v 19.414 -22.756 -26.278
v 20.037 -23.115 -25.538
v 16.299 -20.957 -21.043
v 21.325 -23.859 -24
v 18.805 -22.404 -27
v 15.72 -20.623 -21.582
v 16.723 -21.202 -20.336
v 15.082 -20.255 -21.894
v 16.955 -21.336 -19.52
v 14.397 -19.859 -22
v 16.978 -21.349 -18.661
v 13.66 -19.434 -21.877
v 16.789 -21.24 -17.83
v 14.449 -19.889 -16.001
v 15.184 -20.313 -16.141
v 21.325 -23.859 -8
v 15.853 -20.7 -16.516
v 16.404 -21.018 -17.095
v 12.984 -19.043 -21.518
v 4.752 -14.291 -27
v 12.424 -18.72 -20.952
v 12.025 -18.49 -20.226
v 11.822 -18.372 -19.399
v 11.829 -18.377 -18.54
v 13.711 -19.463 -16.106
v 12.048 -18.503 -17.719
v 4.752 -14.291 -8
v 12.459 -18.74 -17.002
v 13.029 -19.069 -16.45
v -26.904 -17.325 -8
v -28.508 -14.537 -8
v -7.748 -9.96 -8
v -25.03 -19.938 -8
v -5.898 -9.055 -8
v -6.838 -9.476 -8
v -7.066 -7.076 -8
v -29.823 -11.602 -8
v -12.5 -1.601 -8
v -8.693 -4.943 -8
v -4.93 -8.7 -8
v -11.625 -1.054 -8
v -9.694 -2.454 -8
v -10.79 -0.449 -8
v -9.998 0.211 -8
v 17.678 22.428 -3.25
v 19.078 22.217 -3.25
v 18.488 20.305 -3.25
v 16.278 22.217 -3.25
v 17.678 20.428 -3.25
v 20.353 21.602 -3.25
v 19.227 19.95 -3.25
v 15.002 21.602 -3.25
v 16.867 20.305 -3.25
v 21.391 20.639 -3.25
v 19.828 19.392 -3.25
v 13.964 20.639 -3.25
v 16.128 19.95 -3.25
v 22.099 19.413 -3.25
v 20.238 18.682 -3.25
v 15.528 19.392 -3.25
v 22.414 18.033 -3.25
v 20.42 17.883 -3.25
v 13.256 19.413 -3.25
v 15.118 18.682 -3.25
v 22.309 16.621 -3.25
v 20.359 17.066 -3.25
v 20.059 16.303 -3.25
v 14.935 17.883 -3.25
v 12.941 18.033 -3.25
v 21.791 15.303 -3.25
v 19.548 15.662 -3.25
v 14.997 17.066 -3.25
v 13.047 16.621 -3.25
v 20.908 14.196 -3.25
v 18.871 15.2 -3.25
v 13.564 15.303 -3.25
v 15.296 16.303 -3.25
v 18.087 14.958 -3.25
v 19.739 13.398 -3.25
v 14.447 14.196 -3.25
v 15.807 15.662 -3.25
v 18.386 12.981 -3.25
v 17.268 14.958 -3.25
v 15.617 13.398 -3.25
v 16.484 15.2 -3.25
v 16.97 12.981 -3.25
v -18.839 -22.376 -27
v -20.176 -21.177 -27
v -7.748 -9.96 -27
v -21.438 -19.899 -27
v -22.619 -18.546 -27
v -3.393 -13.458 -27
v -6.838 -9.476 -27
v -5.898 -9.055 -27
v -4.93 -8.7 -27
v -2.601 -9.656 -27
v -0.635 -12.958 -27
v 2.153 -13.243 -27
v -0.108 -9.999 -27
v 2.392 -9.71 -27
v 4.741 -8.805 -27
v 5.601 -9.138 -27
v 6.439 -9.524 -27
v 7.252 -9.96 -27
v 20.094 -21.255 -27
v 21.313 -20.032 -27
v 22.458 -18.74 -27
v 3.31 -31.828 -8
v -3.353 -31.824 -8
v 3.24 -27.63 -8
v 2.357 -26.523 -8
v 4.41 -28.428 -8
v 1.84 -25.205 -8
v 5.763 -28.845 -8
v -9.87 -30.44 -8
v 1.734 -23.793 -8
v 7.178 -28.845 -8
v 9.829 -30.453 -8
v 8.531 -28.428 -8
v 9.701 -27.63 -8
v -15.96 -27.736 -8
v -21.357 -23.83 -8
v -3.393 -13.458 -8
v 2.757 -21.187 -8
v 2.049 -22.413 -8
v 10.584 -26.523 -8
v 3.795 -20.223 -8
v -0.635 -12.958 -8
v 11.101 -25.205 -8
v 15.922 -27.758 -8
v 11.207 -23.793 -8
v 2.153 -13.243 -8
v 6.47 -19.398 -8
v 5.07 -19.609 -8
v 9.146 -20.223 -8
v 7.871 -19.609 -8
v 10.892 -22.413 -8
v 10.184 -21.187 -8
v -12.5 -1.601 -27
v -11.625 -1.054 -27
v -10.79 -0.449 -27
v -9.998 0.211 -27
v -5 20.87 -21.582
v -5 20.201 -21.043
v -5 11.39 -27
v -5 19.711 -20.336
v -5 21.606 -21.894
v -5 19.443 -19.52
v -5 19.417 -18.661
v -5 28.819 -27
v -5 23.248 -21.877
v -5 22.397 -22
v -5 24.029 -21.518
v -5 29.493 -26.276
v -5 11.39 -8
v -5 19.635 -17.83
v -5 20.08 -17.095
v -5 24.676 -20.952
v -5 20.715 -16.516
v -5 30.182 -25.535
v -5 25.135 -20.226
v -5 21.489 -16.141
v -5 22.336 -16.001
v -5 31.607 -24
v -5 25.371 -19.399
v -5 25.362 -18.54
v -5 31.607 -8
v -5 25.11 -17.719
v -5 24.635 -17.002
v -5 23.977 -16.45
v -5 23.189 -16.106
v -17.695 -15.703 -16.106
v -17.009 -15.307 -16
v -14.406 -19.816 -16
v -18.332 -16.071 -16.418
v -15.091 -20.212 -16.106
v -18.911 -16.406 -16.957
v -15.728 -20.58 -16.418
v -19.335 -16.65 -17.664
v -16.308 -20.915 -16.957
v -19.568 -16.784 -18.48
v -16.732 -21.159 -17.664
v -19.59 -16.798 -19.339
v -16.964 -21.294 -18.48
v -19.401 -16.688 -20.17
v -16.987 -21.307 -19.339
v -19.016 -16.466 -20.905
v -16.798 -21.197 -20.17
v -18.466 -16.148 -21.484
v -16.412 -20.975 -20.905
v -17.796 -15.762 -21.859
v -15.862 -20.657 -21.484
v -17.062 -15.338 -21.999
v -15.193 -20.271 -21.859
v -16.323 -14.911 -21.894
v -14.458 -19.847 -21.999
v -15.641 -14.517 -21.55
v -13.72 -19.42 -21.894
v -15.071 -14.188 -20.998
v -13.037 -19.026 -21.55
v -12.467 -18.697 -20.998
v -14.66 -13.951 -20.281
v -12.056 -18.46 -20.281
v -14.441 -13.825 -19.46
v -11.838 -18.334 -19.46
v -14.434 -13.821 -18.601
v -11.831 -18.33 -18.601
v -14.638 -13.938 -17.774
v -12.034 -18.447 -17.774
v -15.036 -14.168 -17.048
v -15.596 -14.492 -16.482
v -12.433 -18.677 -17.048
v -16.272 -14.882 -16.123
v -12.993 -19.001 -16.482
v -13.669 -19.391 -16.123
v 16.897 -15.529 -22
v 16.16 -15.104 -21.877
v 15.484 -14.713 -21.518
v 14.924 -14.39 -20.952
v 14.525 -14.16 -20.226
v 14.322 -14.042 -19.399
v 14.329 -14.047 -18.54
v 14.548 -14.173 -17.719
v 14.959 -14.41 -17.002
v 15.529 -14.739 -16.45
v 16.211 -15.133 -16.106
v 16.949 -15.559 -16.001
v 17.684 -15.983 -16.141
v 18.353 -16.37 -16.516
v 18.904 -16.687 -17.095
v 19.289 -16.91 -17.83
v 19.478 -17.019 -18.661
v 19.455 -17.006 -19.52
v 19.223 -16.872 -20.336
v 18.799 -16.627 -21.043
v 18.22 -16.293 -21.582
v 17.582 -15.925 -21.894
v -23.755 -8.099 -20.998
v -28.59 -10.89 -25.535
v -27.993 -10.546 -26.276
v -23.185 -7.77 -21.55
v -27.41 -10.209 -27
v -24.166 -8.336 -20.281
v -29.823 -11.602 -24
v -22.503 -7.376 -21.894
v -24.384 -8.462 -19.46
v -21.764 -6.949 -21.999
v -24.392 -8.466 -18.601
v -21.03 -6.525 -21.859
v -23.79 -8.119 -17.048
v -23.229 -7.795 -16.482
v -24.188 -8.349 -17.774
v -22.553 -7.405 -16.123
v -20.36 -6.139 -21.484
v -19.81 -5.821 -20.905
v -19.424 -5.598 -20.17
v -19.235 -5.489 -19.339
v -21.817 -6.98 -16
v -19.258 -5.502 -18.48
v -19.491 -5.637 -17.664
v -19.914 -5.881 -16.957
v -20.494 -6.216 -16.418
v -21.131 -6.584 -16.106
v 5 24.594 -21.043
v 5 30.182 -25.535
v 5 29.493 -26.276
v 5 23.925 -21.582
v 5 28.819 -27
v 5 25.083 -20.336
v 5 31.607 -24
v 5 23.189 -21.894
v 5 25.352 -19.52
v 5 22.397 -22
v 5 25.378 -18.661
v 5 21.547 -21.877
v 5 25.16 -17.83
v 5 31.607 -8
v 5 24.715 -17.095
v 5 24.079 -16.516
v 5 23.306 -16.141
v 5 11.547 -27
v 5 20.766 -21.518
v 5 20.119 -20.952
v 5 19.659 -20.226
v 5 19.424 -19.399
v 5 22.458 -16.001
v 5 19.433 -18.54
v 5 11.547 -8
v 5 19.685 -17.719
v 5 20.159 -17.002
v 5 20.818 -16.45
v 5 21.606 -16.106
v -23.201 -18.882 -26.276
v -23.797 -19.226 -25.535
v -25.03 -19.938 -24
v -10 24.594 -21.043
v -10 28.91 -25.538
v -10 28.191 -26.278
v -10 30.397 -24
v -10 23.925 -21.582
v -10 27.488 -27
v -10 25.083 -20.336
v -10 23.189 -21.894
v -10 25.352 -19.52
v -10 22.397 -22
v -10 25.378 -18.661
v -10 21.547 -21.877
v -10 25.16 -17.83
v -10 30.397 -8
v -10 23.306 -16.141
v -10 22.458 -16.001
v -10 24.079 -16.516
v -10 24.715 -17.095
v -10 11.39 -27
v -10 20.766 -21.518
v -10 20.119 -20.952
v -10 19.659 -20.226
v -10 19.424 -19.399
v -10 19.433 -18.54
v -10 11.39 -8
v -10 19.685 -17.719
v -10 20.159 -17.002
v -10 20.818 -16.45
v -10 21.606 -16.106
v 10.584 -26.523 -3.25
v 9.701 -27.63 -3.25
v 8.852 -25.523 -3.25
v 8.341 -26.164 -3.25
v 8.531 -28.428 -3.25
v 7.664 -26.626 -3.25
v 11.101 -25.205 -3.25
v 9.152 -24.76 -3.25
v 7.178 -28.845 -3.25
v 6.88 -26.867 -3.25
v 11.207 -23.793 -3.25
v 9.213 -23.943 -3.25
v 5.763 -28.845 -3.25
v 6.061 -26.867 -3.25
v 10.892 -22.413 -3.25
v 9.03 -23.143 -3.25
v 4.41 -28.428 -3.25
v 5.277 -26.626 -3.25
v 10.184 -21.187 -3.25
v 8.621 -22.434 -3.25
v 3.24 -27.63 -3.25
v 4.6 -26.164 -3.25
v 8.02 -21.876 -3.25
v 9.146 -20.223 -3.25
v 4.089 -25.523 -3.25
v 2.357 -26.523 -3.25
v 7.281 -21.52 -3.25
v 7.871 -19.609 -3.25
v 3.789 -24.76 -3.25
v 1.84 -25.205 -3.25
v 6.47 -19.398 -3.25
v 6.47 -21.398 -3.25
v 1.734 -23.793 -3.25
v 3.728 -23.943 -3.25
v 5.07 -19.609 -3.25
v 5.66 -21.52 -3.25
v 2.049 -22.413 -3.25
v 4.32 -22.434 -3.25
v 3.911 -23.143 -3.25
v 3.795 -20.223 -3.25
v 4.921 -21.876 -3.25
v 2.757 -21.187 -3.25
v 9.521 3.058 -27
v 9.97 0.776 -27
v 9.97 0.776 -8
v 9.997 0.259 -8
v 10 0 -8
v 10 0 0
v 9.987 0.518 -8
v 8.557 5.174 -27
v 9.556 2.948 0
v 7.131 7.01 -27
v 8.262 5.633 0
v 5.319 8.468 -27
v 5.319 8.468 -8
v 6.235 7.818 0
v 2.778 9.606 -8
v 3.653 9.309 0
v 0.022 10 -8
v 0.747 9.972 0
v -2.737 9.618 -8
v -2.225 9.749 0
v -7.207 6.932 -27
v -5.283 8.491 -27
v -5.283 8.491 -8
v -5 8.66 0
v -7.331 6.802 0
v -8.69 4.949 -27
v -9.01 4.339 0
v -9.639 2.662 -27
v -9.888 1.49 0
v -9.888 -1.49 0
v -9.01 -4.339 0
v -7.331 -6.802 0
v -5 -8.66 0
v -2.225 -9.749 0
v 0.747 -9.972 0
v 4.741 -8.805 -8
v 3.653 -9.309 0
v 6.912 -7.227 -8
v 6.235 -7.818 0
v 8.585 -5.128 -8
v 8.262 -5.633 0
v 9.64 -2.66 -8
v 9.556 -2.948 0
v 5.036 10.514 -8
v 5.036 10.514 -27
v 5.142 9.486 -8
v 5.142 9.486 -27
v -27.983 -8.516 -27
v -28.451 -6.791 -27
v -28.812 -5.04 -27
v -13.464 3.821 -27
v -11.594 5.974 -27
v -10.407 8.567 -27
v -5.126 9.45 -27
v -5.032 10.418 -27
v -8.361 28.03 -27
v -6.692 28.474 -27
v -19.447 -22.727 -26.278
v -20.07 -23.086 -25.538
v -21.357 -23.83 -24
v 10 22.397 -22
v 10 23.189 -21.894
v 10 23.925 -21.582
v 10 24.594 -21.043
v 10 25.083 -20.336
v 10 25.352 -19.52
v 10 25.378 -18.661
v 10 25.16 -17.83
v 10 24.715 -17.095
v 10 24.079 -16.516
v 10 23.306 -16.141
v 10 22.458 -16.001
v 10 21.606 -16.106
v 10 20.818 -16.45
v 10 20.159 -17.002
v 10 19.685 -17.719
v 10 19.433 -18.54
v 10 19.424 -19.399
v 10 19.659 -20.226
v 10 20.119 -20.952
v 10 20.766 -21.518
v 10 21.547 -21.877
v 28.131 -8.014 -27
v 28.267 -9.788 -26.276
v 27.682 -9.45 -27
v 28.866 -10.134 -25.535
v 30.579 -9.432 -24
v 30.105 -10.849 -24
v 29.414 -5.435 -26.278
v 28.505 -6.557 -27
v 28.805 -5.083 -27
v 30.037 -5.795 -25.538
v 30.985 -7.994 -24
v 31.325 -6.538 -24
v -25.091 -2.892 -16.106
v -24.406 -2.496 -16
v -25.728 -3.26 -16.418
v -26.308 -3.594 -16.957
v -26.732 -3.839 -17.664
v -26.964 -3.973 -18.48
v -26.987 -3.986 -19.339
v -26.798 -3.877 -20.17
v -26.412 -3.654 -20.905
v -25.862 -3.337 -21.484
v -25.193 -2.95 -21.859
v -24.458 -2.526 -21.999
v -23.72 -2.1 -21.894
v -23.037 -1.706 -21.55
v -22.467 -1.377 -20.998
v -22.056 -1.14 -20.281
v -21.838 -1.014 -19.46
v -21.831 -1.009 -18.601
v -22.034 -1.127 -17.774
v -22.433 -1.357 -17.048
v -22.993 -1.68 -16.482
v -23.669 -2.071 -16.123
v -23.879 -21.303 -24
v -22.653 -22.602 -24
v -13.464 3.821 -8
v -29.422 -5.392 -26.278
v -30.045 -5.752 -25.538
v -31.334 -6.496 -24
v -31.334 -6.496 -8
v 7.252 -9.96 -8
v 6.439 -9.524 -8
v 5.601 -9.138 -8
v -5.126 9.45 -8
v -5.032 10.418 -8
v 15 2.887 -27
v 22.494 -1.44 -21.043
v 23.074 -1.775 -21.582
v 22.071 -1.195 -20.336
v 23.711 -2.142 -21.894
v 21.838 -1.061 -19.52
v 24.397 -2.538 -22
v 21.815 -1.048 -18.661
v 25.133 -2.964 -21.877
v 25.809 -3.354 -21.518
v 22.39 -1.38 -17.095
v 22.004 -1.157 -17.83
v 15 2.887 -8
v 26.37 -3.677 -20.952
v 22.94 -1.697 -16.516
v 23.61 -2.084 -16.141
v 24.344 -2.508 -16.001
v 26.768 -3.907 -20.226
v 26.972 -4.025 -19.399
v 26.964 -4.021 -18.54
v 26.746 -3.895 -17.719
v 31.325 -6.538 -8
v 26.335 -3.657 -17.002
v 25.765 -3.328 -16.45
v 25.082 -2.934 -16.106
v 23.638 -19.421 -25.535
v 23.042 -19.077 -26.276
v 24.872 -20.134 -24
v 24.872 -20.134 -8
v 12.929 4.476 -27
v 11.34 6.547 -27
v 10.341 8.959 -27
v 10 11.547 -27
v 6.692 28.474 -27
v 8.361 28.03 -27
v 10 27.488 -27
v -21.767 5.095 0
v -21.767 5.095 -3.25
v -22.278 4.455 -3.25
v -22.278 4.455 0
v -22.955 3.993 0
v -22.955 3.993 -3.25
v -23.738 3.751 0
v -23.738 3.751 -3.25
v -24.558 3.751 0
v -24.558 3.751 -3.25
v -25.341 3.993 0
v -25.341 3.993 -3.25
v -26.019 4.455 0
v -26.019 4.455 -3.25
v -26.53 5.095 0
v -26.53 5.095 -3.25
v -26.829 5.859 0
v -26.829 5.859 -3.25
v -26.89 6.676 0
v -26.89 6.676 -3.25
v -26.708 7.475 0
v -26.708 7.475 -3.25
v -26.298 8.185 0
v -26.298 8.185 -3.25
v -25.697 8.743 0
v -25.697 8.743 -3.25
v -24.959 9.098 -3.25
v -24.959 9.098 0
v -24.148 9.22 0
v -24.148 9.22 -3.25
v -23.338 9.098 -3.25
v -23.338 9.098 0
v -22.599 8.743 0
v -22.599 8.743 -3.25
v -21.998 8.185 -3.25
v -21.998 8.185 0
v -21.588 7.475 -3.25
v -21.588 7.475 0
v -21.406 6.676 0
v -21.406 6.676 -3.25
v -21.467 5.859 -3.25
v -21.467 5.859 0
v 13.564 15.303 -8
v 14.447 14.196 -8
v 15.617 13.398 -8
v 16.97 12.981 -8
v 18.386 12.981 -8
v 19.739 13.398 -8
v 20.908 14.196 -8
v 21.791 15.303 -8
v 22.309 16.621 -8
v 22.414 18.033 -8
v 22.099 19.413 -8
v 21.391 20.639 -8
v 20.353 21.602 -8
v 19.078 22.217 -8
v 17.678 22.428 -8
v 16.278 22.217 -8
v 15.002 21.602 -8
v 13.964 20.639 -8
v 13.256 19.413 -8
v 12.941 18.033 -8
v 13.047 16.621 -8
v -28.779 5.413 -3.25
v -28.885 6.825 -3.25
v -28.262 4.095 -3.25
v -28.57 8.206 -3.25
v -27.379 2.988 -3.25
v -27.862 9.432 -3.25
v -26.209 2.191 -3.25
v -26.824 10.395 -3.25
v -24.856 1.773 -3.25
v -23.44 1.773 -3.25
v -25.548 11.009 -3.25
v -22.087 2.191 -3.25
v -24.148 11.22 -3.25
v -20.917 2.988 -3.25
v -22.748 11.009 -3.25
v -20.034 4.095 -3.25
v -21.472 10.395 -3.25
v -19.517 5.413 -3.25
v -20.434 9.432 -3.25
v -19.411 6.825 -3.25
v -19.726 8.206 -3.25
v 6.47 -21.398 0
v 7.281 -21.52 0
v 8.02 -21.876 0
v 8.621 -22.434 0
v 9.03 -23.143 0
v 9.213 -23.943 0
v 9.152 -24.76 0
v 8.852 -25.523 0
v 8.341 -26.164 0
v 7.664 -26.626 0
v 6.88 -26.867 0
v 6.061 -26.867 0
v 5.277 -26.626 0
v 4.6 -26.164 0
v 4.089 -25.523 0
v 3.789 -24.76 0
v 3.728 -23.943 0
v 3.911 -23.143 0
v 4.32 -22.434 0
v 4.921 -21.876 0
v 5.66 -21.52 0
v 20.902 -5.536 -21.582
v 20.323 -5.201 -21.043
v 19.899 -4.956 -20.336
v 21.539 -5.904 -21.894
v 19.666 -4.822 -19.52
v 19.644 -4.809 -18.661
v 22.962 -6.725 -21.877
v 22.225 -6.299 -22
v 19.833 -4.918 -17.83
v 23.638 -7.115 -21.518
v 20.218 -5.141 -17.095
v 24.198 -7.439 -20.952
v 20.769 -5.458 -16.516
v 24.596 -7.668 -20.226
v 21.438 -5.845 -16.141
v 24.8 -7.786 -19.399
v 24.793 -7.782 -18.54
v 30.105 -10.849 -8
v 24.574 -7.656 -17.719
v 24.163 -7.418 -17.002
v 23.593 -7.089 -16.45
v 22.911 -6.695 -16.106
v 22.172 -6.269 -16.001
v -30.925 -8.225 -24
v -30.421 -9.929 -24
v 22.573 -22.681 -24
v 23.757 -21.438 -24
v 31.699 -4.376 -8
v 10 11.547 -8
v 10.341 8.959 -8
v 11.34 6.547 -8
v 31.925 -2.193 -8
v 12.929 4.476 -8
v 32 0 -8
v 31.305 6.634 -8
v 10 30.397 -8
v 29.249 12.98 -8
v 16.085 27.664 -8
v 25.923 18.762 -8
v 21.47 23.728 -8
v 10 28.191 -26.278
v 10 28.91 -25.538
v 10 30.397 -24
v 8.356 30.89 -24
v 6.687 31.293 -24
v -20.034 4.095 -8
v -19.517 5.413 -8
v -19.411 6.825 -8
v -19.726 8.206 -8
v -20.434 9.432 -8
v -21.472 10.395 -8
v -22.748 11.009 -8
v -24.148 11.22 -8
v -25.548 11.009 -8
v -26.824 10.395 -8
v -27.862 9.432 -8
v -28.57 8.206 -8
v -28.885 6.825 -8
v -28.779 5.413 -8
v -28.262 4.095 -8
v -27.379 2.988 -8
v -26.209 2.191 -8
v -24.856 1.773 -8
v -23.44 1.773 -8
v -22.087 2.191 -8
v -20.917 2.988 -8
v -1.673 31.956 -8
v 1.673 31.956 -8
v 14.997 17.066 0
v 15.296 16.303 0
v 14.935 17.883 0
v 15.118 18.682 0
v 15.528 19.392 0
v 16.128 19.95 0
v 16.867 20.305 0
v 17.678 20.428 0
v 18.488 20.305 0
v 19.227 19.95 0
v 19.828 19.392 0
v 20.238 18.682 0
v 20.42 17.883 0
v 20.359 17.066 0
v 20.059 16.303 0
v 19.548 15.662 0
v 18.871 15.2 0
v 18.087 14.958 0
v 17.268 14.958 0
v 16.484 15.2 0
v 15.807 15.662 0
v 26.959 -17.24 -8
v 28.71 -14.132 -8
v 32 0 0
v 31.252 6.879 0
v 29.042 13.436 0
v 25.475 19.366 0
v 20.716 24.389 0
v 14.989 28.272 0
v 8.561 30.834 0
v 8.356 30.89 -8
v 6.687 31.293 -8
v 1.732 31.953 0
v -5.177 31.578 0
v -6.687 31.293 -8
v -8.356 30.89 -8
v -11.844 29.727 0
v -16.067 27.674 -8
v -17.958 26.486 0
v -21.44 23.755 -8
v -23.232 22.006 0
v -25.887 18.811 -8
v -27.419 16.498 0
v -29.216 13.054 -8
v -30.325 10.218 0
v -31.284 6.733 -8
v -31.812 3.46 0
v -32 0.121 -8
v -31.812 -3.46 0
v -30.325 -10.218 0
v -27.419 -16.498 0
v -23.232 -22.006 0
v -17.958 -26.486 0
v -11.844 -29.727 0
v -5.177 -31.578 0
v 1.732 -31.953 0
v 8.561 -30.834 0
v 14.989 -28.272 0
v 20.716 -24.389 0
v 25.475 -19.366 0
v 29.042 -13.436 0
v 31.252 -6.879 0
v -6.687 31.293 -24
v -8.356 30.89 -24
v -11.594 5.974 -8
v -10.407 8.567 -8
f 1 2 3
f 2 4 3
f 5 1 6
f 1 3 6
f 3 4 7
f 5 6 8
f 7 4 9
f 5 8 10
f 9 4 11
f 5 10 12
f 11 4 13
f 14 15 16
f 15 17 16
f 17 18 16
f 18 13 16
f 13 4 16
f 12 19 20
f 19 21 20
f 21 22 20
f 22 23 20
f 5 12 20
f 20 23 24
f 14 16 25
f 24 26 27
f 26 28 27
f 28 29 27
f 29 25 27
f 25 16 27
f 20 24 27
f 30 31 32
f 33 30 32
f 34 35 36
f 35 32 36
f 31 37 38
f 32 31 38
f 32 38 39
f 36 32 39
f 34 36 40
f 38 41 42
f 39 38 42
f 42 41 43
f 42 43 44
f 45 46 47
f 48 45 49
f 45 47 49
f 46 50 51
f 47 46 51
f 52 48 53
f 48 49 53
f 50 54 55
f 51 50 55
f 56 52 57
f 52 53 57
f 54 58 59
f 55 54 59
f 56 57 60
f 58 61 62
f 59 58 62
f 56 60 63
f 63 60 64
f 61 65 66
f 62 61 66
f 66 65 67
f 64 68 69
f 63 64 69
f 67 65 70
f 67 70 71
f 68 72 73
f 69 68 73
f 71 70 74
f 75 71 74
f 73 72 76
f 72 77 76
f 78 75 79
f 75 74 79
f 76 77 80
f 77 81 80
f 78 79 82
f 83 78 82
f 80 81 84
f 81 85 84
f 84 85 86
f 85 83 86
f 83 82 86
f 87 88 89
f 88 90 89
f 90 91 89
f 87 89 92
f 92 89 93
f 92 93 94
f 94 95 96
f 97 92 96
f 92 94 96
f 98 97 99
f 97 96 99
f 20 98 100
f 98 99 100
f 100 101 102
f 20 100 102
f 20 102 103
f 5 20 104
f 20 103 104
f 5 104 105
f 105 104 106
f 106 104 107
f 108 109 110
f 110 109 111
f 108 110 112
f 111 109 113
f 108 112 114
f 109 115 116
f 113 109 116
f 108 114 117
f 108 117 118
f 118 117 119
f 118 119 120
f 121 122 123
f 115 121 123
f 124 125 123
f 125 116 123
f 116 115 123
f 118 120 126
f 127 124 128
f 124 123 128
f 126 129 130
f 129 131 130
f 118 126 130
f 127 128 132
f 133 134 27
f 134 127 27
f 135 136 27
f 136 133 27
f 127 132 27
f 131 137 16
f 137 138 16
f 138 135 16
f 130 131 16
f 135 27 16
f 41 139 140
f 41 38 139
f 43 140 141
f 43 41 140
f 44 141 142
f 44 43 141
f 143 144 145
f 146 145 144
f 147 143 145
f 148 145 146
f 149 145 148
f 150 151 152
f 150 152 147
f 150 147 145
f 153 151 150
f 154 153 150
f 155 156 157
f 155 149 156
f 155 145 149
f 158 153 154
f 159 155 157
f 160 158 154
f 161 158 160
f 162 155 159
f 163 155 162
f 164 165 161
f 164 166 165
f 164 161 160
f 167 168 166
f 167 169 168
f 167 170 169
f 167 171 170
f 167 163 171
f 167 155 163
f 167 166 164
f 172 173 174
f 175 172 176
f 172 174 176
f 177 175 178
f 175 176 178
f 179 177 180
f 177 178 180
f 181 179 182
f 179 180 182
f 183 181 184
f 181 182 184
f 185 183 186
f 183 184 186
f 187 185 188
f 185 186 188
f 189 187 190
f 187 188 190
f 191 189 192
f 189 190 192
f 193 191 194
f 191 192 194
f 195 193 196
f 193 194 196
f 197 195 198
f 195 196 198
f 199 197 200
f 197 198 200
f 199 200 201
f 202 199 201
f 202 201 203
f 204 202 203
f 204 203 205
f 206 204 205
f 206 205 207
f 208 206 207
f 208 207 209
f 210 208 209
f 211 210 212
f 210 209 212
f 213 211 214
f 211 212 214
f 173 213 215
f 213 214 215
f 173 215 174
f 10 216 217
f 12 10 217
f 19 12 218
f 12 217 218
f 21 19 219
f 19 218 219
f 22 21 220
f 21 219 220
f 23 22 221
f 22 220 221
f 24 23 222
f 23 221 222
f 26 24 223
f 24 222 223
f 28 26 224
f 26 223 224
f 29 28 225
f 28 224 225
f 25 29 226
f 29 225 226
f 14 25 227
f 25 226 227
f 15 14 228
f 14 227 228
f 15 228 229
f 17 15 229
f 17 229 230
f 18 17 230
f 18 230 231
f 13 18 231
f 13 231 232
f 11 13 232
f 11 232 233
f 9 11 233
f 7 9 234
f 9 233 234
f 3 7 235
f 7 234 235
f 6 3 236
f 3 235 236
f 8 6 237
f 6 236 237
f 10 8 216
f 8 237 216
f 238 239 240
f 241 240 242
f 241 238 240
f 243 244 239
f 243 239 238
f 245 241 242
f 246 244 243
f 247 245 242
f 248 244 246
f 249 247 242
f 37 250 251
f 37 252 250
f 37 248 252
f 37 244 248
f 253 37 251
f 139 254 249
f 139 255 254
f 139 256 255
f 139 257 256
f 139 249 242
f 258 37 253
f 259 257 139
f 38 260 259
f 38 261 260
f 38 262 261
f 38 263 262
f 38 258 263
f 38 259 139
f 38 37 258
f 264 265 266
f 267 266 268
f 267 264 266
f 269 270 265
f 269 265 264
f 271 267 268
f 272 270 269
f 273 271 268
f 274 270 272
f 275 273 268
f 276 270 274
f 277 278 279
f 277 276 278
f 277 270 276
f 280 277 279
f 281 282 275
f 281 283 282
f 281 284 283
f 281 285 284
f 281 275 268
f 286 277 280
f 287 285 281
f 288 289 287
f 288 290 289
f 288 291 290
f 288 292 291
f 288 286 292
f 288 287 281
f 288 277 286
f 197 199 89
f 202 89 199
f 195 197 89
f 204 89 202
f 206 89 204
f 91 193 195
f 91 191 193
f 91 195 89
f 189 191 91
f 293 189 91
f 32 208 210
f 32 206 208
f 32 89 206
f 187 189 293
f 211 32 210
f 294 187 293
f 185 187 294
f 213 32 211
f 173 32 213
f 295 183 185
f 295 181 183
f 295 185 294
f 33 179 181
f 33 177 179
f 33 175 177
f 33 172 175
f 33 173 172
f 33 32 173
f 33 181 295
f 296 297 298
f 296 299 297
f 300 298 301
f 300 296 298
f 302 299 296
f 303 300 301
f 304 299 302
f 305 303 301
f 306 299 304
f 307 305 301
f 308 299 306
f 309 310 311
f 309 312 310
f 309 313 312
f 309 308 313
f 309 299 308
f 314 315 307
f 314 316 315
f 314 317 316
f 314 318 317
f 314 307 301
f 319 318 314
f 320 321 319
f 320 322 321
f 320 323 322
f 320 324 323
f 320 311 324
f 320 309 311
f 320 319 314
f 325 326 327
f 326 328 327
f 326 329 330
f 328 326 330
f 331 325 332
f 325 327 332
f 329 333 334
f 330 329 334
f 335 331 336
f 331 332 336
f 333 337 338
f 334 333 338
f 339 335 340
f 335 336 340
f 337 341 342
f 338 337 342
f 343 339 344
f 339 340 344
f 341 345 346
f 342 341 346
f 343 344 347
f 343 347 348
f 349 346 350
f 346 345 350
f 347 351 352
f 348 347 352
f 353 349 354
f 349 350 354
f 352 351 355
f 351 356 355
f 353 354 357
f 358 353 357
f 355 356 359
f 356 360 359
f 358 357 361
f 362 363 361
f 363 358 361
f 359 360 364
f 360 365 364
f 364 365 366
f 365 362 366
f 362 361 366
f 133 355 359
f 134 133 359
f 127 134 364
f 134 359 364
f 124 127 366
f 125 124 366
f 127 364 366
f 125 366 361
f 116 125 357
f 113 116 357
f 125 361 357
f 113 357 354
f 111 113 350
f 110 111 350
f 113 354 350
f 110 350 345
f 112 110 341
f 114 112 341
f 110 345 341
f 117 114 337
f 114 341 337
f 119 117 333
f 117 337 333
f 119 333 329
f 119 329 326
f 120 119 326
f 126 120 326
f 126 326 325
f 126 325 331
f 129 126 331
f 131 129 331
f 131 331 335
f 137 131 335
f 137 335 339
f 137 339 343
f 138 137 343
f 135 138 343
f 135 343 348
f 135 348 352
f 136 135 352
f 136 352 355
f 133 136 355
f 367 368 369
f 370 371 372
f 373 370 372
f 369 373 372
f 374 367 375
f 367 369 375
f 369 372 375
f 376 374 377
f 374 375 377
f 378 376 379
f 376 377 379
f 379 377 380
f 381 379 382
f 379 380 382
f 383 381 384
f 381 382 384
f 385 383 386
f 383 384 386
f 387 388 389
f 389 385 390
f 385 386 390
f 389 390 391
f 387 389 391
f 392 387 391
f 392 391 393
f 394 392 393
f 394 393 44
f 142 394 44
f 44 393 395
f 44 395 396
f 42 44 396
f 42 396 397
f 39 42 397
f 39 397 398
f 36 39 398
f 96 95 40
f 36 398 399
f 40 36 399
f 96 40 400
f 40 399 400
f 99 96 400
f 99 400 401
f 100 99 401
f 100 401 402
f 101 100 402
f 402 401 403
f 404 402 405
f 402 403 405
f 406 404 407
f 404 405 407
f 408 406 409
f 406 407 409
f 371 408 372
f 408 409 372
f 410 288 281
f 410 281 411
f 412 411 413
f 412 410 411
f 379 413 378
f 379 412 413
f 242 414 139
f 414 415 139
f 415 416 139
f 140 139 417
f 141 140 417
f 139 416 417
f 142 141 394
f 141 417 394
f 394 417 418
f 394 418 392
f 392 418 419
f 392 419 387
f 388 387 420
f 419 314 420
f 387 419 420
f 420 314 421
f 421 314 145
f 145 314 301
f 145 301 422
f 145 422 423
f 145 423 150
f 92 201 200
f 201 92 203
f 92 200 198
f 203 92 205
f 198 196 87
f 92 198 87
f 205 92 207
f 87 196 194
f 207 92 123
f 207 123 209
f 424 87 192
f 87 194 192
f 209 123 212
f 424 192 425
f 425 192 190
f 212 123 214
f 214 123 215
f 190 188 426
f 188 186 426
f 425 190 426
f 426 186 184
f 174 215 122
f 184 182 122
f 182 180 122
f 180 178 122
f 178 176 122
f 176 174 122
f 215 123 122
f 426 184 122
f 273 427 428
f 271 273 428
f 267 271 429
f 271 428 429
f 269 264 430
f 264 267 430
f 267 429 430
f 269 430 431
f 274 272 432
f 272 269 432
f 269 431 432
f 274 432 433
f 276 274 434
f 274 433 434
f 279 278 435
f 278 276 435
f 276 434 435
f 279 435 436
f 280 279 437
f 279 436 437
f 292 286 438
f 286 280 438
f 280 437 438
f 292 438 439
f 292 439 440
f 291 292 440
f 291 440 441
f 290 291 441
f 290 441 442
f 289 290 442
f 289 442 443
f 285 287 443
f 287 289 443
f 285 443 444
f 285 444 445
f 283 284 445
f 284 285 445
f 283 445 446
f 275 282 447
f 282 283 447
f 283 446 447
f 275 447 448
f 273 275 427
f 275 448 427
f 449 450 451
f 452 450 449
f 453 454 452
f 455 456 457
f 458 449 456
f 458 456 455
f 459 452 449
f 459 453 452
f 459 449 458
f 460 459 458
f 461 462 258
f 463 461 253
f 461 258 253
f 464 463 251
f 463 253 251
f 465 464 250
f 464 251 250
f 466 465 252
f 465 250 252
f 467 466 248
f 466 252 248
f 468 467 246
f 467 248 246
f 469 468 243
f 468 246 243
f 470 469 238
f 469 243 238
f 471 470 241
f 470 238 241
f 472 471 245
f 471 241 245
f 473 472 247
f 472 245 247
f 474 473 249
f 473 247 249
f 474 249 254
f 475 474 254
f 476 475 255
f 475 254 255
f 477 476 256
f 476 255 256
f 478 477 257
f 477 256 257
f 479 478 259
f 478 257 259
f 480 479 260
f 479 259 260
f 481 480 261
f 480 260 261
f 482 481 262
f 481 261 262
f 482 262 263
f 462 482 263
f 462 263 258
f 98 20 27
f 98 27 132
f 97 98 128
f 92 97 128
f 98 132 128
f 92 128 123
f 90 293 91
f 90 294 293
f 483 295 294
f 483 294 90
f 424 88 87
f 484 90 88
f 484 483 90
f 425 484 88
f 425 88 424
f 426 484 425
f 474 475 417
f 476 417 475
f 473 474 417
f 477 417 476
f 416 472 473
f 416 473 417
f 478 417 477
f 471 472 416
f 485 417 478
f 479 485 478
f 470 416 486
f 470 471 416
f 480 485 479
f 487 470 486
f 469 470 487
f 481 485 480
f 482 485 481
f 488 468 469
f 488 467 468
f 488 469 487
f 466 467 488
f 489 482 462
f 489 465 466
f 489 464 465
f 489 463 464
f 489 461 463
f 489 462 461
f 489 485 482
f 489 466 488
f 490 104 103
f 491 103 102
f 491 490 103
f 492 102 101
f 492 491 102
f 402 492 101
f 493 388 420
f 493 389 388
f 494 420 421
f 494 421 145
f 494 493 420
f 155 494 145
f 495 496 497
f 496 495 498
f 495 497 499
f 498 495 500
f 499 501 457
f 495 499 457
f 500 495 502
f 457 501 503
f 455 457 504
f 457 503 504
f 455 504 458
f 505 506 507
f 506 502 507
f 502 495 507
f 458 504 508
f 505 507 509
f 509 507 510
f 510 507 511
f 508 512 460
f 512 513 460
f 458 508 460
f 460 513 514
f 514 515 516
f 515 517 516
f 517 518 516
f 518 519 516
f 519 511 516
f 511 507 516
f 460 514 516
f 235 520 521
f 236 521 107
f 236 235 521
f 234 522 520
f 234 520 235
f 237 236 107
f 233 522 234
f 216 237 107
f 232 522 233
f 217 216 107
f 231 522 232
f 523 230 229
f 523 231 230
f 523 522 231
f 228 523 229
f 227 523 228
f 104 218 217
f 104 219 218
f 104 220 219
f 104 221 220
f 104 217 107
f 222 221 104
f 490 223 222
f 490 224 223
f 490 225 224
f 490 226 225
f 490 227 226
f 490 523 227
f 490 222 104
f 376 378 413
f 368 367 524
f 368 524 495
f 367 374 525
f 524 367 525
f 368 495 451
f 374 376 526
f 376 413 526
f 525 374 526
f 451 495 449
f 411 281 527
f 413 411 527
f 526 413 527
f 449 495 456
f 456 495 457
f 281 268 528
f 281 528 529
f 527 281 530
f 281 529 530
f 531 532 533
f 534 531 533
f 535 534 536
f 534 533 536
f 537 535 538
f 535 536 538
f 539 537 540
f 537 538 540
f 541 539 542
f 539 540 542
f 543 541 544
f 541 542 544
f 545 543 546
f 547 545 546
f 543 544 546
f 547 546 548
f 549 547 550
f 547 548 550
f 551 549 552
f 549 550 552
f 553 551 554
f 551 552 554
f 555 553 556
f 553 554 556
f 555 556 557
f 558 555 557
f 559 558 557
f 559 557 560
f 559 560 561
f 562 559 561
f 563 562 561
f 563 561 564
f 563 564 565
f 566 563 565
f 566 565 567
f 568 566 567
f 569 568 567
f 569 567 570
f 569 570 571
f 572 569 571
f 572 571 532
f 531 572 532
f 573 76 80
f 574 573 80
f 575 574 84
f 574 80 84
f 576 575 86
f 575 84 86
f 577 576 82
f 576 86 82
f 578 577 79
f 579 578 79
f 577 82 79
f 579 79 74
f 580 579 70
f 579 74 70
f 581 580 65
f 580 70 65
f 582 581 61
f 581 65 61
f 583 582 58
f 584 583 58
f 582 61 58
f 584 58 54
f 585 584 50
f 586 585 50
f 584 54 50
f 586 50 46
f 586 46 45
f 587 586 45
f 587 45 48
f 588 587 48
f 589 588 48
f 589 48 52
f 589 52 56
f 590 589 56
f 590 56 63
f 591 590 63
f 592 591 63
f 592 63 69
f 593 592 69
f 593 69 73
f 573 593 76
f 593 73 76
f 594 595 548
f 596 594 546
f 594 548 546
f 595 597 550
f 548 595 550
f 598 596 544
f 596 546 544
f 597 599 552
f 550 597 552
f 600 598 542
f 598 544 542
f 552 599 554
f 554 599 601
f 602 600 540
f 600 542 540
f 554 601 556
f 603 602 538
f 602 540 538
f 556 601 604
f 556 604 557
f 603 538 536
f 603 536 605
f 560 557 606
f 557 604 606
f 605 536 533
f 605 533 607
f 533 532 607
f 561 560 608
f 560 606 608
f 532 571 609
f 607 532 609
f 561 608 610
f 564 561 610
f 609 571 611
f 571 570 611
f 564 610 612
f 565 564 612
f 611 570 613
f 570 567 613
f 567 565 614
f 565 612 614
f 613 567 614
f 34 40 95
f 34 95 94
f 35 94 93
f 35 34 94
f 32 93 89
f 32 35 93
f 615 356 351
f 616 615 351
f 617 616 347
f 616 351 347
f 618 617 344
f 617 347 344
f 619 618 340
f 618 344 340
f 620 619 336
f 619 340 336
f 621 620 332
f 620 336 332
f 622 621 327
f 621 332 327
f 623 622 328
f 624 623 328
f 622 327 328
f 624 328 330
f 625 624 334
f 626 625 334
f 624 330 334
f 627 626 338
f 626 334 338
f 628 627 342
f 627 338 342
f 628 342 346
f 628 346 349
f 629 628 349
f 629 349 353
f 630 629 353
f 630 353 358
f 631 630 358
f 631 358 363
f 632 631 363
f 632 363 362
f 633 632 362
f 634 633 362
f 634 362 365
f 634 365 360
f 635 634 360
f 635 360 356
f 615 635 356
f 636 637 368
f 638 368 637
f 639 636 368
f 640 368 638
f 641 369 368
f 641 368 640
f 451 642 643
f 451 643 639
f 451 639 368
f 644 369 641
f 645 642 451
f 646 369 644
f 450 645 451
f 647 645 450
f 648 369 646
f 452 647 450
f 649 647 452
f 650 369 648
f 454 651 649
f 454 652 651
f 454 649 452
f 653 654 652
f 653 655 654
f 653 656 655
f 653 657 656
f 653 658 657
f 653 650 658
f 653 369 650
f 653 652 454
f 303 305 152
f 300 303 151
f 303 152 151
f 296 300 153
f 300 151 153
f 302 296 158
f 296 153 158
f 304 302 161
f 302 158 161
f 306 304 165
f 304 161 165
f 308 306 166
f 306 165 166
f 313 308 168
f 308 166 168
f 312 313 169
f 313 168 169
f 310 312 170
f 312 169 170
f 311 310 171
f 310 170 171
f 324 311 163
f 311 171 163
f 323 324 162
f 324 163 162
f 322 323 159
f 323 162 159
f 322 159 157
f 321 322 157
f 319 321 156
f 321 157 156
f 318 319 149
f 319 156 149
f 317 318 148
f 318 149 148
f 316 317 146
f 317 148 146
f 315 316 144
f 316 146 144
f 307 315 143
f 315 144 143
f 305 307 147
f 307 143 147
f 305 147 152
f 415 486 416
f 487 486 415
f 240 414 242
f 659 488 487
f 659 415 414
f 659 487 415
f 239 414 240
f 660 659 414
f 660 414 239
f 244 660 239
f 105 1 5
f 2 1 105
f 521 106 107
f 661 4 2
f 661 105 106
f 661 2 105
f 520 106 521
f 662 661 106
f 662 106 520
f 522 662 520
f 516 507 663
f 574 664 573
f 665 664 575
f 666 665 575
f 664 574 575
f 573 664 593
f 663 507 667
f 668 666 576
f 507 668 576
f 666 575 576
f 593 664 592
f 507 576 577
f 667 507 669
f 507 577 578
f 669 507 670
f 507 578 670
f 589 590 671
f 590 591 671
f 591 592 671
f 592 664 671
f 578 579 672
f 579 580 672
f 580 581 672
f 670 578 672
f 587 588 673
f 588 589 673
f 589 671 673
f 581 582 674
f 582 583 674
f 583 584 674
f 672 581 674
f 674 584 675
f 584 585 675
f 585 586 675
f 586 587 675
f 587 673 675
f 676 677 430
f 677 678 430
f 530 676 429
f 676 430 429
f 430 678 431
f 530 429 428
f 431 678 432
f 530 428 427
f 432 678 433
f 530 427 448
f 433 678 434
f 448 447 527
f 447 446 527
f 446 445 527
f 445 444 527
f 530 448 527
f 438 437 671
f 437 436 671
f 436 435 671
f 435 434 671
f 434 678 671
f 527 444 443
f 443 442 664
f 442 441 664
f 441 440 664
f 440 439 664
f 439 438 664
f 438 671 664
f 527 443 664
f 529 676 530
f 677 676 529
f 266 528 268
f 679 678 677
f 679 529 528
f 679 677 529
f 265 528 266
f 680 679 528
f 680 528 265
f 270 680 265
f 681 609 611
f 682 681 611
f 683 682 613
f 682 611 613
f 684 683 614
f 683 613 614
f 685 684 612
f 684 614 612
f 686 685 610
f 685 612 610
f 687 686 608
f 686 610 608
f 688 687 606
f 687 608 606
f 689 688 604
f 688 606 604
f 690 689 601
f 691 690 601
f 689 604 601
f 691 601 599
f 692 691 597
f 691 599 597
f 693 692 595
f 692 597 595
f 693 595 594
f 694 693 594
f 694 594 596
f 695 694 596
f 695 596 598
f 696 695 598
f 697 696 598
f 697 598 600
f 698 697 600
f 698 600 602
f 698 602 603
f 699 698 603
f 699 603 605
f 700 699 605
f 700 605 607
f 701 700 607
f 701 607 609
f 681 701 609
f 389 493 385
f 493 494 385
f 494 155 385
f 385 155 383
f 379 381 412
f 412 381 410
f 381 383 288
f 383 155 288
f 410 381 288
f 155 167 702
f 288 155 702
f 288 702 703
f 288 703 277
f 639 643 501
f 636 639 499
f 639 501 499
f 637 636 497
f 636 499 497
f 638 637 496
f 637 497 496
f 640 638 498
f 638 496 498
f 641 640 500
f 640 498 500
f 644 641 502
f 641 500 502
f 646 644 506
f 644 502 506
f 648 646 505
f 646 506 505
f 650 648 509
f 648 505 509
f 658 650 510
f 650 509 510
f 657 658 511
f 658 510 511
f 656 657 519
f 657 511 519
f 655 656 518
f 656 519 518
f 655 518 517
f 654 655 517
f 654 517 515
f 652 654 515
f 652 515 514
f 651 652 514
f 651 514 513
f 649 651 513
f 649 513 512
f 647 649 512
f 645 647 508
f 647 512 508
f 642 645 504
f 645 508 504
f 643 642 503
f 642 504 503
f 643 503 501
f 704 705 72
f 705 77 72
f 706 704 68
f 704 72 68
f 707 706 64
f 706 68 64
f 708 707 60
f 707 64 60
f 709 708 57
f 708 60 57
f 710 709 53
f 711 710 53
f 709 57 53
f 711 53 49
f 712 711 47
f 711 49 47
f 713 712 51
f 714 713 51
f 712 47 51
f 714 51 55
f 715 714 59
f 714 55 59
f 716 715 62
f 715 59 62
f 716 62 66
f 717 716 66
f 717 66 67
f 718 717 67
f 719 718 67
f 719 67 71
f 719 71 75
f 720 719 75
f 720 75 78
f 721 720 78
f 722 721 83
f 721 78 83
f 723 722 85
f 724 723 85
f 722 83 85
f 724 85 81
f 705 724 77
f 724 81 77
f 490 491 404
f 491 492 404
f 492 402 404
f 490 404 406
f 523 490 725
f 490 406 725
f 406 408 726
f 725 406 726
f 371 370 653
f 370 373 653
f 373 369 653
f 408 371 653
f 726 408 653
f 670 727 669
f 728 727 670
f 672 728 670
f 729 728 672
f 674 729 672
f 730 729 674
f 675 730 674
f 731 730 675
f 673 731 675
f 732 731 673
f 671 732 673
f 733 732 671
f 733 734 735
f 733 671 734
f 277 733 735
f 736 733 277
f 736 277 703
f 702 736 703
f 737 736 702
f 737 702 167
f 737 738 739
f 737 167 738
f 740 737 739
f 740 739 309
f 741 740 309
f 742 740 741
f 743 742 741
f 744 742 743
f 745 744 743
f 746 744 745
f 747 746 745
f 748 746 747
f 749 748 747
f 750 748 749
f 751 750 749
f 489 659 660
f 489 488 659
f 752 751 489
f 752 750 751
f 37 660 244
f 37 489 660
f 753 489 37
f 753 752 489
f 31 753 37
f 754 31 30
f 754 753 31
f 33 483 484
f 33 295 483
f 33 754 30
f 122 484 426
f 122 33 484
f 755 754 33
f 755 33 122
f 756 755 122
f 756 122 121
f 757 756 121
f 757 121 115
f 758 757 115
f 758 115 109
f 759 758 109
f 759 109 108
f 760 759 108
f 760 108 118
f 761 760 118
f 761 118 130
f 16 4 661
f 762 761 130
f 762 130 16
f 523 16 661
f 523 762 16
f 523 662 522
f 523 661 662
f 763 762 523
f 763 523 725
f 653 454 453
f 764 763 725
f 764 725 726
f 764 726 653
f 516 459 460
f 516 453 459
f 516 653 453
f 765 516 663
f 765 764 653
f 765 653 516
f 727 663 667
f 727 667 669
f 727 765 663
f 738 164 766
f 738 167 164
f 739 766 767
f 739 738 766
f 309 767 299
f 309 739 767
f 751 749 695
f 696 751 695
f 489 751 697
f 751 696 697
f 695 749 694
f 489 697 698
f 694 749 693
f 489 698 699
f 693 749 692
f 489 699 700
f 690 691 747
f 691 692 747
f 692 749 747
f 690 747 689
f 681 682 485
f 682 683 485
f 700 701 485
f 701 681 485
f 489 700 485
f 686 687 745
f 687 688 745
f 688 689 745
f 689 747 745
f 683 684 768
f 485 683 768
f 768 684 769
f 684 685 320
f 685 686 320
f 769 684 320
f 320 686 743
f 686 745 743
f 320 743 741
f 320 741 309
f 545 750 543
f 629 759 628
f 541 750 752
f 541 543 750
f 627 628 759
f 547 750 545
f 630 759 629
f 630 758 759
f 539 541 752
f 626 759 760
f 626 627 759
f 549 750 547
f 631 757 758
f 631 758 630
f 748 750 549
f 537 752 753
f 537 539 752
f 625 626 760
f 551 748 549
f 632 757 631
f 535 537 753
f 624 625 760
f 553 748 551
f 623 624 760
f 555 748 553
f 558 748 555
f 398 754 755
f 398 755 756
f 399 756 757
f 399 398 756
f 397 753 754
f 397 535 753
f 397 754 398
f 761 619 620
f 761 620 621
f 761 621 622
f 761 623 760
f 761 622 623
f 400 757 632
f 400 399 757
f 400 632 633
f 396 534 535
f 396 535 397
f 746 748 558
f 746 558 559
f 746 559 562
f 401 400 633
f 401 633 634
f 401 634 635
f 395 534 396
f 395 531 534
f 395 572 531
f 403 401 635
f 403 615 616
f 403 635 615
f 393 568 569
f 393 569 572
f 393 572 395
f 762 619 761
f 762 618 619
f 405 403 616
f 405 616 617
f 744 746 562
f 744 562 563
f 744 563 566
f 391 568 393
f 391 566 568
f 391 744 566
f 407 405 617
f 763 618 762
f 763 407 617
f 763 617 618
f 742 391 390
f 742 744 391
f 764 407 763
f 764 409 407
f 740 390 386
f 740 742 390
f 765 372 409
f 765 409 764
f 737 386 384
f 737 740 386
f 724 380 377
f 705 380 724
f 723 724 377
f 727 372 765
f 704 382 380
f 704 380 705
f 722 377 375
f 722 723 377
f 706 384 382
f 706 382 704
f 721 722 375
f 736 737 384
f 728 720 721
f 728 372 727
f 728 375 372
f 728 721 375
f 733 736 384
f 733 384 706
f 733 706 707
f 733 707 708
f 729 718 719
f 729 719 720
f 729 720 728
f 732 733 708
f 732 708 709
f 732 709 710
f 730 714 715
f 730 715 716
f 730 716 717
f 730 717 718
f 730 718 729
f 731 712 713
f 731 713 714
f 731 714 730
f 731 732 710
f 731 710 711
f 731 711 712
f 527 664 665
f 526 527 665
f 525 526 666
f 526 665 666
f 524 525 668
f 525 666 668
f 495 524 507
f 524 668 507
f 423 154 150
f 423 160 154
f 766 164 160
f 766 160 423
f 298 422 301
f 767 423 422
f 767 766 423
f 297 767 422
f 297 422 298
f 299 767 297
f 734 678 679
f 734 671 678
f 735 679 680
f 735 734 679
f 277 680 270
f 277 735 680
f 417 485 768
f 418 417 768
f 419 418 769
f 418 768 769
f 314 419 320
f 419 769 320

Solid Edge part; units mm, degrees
sketch "Sketch1" plane through (0, 0, 0) normal (0, 0, 1) x (1, 0, 0)
  circle A0 centre (0, 0) radius 32
extrude "Protrusion1" add sketch "Sketch1" against normal blind 8
sketch "Sketch2" plane through (0, 0, 0) normal (0, 0, 1) x (1, 0, 0)
  circle A0 centre (0, 0) radius 10
extrude "nucleo" add sketch "Sketch2" along normal blind 3
sketch "Sketch3" plane through (0, 0, -8) normal (0, 0, -1) x (-1, 0, 0)
  line L0 (-9.0257, 1.3213) -> (-30.1049, -10.8488)
  arc A0 (-31.3249, -6.5384) -> (-30.1049, -10.8488) centre (0, 0) ccw
  line L1 (-15, 2.8868) -> (-31.3249, -6.5384)
  arc A1 (-10, 11.547) -> (-15, 2.8868) centre (-20, 11.547) cw
  line L2 (-10, 30.3974) -> (-10, 11.547)
  arc A2 (-5, 31.607) -> (-10, 30.3974) centre (0, 0) ccw
  line L3 (-5, 31.607) -> (-5, 11.547)
  arc A3 (-5, 11.547) -> (-9.0257, 1.3213) centre (-20, 11.547) cw
  line L4 (13.4645, 3.821) -> (31.3338, -6.4958)
  arc A4 (29.8227, -11.6019) -> (31.3338, -6.4958) centre (0, 0) ccw
  line L5 (29.8227, -11.6019) -> (12.5, -1.6006)
  arc A5 (12.5, -1.6006) -> (5, 11.3898) centre (20, 11.3898) cw
  line L6 (5, 11.3898) -> (5, 31.607)
  arc A6 (10, 30.3974) -> (5, 31.607) centre (0, 0) ccw
  line L7 (10, 30.3974) -> (10, 11.3898)
  arc A7 (10, 11.3898) -> (13.4645, 3.821) centre (20, 11.3898) ccw
  line L8 (7.748, -9.9604) -> (25.0296, -19.9379)
  arc A8 (21.3573, -23.8299) -> (25.0296, -19.9379) centre (0, 0) ccw
  line L9 (3.3929, -13.4582) -> (21.3573, -23.8299)
  arc A9 (-4.752, -14.2906) -> (3.3929, -13.4582) centre (0.248, -22.9508) cw
  line L10 (-21.3249, -23.8589) -> (-4.752, -14.2906)
  arc A10 (-24.8724, -20.1336) -> (-21.3249, -23.8589) centre (0, 0) ccw
  line L11 (-24.8724, -20.1336) -> (-7.252, -9.9604)
  arc A11 (-7.252, -9.9604) -> (7.748, -9.9604) centre (0.248, -22.9508) cw
extrude "paredes" add sketch "Sketch3" along normal blind 19
sketch "Sketch4" plane through (0, 0, 0) normal (0, 0, 1) x (1, 0, 0)
  circle A0 centre (0, 0) radius 10
extrude "VaciadoExtruido_3" cut sketch "Sketch4" along normal mid plane 58
hole "Agujero_1" at (6.4705, -24.1481, -8) direction (0, 0, 1) diameter 9.5 depth 4.75
hole "Hole1" [suppressed]
hole "Agujero_3" at (6.4705, -24.1481, -3.25) direction (0, 0, 1) diameter 5.5 end through all
hole "Agujero_6" at (14.3967, -19.8589, -19) direction (0.5, 0.866, 0) diameter 6 end through all
hole "Agujero_7" at (-24.4055, -2.4958, -19) direction (0.5, -0.866, 0) diameter 6 end through all
hole "Agujero_8" at (10, 22.3974, -19) direction (-1, 0, 0) diameter 6 end through all
chamfer "CHAFLAN" distance 2.75 distance2 3 2 edges at (7.5243, 31.1028, -27) (30.7904, -8.715, -27) measured on face at (9.1242, 10.8036, -27)
chamfer "Chaflán_2" distance 2.75 distance2 3 2 edges at (-7.5243, 31.1028, -27) (-30.6846, -9.0804, -27) measured on face at (-18.4302, -3.9683, -27)
chamfer "Chaflán_3" distance 2.75 distance2 3 2 edges at (-23.2749, -21.9608, -27) (23.1736, -22.0677, -27) measured on face at (-17.2116, -21.1809, -27)
pattern_circular "Pattern1" count 3 over 360 about axis through (0, 0, -8) along (0, 0, 1) of "Agujero_1", "Agujero_3"
